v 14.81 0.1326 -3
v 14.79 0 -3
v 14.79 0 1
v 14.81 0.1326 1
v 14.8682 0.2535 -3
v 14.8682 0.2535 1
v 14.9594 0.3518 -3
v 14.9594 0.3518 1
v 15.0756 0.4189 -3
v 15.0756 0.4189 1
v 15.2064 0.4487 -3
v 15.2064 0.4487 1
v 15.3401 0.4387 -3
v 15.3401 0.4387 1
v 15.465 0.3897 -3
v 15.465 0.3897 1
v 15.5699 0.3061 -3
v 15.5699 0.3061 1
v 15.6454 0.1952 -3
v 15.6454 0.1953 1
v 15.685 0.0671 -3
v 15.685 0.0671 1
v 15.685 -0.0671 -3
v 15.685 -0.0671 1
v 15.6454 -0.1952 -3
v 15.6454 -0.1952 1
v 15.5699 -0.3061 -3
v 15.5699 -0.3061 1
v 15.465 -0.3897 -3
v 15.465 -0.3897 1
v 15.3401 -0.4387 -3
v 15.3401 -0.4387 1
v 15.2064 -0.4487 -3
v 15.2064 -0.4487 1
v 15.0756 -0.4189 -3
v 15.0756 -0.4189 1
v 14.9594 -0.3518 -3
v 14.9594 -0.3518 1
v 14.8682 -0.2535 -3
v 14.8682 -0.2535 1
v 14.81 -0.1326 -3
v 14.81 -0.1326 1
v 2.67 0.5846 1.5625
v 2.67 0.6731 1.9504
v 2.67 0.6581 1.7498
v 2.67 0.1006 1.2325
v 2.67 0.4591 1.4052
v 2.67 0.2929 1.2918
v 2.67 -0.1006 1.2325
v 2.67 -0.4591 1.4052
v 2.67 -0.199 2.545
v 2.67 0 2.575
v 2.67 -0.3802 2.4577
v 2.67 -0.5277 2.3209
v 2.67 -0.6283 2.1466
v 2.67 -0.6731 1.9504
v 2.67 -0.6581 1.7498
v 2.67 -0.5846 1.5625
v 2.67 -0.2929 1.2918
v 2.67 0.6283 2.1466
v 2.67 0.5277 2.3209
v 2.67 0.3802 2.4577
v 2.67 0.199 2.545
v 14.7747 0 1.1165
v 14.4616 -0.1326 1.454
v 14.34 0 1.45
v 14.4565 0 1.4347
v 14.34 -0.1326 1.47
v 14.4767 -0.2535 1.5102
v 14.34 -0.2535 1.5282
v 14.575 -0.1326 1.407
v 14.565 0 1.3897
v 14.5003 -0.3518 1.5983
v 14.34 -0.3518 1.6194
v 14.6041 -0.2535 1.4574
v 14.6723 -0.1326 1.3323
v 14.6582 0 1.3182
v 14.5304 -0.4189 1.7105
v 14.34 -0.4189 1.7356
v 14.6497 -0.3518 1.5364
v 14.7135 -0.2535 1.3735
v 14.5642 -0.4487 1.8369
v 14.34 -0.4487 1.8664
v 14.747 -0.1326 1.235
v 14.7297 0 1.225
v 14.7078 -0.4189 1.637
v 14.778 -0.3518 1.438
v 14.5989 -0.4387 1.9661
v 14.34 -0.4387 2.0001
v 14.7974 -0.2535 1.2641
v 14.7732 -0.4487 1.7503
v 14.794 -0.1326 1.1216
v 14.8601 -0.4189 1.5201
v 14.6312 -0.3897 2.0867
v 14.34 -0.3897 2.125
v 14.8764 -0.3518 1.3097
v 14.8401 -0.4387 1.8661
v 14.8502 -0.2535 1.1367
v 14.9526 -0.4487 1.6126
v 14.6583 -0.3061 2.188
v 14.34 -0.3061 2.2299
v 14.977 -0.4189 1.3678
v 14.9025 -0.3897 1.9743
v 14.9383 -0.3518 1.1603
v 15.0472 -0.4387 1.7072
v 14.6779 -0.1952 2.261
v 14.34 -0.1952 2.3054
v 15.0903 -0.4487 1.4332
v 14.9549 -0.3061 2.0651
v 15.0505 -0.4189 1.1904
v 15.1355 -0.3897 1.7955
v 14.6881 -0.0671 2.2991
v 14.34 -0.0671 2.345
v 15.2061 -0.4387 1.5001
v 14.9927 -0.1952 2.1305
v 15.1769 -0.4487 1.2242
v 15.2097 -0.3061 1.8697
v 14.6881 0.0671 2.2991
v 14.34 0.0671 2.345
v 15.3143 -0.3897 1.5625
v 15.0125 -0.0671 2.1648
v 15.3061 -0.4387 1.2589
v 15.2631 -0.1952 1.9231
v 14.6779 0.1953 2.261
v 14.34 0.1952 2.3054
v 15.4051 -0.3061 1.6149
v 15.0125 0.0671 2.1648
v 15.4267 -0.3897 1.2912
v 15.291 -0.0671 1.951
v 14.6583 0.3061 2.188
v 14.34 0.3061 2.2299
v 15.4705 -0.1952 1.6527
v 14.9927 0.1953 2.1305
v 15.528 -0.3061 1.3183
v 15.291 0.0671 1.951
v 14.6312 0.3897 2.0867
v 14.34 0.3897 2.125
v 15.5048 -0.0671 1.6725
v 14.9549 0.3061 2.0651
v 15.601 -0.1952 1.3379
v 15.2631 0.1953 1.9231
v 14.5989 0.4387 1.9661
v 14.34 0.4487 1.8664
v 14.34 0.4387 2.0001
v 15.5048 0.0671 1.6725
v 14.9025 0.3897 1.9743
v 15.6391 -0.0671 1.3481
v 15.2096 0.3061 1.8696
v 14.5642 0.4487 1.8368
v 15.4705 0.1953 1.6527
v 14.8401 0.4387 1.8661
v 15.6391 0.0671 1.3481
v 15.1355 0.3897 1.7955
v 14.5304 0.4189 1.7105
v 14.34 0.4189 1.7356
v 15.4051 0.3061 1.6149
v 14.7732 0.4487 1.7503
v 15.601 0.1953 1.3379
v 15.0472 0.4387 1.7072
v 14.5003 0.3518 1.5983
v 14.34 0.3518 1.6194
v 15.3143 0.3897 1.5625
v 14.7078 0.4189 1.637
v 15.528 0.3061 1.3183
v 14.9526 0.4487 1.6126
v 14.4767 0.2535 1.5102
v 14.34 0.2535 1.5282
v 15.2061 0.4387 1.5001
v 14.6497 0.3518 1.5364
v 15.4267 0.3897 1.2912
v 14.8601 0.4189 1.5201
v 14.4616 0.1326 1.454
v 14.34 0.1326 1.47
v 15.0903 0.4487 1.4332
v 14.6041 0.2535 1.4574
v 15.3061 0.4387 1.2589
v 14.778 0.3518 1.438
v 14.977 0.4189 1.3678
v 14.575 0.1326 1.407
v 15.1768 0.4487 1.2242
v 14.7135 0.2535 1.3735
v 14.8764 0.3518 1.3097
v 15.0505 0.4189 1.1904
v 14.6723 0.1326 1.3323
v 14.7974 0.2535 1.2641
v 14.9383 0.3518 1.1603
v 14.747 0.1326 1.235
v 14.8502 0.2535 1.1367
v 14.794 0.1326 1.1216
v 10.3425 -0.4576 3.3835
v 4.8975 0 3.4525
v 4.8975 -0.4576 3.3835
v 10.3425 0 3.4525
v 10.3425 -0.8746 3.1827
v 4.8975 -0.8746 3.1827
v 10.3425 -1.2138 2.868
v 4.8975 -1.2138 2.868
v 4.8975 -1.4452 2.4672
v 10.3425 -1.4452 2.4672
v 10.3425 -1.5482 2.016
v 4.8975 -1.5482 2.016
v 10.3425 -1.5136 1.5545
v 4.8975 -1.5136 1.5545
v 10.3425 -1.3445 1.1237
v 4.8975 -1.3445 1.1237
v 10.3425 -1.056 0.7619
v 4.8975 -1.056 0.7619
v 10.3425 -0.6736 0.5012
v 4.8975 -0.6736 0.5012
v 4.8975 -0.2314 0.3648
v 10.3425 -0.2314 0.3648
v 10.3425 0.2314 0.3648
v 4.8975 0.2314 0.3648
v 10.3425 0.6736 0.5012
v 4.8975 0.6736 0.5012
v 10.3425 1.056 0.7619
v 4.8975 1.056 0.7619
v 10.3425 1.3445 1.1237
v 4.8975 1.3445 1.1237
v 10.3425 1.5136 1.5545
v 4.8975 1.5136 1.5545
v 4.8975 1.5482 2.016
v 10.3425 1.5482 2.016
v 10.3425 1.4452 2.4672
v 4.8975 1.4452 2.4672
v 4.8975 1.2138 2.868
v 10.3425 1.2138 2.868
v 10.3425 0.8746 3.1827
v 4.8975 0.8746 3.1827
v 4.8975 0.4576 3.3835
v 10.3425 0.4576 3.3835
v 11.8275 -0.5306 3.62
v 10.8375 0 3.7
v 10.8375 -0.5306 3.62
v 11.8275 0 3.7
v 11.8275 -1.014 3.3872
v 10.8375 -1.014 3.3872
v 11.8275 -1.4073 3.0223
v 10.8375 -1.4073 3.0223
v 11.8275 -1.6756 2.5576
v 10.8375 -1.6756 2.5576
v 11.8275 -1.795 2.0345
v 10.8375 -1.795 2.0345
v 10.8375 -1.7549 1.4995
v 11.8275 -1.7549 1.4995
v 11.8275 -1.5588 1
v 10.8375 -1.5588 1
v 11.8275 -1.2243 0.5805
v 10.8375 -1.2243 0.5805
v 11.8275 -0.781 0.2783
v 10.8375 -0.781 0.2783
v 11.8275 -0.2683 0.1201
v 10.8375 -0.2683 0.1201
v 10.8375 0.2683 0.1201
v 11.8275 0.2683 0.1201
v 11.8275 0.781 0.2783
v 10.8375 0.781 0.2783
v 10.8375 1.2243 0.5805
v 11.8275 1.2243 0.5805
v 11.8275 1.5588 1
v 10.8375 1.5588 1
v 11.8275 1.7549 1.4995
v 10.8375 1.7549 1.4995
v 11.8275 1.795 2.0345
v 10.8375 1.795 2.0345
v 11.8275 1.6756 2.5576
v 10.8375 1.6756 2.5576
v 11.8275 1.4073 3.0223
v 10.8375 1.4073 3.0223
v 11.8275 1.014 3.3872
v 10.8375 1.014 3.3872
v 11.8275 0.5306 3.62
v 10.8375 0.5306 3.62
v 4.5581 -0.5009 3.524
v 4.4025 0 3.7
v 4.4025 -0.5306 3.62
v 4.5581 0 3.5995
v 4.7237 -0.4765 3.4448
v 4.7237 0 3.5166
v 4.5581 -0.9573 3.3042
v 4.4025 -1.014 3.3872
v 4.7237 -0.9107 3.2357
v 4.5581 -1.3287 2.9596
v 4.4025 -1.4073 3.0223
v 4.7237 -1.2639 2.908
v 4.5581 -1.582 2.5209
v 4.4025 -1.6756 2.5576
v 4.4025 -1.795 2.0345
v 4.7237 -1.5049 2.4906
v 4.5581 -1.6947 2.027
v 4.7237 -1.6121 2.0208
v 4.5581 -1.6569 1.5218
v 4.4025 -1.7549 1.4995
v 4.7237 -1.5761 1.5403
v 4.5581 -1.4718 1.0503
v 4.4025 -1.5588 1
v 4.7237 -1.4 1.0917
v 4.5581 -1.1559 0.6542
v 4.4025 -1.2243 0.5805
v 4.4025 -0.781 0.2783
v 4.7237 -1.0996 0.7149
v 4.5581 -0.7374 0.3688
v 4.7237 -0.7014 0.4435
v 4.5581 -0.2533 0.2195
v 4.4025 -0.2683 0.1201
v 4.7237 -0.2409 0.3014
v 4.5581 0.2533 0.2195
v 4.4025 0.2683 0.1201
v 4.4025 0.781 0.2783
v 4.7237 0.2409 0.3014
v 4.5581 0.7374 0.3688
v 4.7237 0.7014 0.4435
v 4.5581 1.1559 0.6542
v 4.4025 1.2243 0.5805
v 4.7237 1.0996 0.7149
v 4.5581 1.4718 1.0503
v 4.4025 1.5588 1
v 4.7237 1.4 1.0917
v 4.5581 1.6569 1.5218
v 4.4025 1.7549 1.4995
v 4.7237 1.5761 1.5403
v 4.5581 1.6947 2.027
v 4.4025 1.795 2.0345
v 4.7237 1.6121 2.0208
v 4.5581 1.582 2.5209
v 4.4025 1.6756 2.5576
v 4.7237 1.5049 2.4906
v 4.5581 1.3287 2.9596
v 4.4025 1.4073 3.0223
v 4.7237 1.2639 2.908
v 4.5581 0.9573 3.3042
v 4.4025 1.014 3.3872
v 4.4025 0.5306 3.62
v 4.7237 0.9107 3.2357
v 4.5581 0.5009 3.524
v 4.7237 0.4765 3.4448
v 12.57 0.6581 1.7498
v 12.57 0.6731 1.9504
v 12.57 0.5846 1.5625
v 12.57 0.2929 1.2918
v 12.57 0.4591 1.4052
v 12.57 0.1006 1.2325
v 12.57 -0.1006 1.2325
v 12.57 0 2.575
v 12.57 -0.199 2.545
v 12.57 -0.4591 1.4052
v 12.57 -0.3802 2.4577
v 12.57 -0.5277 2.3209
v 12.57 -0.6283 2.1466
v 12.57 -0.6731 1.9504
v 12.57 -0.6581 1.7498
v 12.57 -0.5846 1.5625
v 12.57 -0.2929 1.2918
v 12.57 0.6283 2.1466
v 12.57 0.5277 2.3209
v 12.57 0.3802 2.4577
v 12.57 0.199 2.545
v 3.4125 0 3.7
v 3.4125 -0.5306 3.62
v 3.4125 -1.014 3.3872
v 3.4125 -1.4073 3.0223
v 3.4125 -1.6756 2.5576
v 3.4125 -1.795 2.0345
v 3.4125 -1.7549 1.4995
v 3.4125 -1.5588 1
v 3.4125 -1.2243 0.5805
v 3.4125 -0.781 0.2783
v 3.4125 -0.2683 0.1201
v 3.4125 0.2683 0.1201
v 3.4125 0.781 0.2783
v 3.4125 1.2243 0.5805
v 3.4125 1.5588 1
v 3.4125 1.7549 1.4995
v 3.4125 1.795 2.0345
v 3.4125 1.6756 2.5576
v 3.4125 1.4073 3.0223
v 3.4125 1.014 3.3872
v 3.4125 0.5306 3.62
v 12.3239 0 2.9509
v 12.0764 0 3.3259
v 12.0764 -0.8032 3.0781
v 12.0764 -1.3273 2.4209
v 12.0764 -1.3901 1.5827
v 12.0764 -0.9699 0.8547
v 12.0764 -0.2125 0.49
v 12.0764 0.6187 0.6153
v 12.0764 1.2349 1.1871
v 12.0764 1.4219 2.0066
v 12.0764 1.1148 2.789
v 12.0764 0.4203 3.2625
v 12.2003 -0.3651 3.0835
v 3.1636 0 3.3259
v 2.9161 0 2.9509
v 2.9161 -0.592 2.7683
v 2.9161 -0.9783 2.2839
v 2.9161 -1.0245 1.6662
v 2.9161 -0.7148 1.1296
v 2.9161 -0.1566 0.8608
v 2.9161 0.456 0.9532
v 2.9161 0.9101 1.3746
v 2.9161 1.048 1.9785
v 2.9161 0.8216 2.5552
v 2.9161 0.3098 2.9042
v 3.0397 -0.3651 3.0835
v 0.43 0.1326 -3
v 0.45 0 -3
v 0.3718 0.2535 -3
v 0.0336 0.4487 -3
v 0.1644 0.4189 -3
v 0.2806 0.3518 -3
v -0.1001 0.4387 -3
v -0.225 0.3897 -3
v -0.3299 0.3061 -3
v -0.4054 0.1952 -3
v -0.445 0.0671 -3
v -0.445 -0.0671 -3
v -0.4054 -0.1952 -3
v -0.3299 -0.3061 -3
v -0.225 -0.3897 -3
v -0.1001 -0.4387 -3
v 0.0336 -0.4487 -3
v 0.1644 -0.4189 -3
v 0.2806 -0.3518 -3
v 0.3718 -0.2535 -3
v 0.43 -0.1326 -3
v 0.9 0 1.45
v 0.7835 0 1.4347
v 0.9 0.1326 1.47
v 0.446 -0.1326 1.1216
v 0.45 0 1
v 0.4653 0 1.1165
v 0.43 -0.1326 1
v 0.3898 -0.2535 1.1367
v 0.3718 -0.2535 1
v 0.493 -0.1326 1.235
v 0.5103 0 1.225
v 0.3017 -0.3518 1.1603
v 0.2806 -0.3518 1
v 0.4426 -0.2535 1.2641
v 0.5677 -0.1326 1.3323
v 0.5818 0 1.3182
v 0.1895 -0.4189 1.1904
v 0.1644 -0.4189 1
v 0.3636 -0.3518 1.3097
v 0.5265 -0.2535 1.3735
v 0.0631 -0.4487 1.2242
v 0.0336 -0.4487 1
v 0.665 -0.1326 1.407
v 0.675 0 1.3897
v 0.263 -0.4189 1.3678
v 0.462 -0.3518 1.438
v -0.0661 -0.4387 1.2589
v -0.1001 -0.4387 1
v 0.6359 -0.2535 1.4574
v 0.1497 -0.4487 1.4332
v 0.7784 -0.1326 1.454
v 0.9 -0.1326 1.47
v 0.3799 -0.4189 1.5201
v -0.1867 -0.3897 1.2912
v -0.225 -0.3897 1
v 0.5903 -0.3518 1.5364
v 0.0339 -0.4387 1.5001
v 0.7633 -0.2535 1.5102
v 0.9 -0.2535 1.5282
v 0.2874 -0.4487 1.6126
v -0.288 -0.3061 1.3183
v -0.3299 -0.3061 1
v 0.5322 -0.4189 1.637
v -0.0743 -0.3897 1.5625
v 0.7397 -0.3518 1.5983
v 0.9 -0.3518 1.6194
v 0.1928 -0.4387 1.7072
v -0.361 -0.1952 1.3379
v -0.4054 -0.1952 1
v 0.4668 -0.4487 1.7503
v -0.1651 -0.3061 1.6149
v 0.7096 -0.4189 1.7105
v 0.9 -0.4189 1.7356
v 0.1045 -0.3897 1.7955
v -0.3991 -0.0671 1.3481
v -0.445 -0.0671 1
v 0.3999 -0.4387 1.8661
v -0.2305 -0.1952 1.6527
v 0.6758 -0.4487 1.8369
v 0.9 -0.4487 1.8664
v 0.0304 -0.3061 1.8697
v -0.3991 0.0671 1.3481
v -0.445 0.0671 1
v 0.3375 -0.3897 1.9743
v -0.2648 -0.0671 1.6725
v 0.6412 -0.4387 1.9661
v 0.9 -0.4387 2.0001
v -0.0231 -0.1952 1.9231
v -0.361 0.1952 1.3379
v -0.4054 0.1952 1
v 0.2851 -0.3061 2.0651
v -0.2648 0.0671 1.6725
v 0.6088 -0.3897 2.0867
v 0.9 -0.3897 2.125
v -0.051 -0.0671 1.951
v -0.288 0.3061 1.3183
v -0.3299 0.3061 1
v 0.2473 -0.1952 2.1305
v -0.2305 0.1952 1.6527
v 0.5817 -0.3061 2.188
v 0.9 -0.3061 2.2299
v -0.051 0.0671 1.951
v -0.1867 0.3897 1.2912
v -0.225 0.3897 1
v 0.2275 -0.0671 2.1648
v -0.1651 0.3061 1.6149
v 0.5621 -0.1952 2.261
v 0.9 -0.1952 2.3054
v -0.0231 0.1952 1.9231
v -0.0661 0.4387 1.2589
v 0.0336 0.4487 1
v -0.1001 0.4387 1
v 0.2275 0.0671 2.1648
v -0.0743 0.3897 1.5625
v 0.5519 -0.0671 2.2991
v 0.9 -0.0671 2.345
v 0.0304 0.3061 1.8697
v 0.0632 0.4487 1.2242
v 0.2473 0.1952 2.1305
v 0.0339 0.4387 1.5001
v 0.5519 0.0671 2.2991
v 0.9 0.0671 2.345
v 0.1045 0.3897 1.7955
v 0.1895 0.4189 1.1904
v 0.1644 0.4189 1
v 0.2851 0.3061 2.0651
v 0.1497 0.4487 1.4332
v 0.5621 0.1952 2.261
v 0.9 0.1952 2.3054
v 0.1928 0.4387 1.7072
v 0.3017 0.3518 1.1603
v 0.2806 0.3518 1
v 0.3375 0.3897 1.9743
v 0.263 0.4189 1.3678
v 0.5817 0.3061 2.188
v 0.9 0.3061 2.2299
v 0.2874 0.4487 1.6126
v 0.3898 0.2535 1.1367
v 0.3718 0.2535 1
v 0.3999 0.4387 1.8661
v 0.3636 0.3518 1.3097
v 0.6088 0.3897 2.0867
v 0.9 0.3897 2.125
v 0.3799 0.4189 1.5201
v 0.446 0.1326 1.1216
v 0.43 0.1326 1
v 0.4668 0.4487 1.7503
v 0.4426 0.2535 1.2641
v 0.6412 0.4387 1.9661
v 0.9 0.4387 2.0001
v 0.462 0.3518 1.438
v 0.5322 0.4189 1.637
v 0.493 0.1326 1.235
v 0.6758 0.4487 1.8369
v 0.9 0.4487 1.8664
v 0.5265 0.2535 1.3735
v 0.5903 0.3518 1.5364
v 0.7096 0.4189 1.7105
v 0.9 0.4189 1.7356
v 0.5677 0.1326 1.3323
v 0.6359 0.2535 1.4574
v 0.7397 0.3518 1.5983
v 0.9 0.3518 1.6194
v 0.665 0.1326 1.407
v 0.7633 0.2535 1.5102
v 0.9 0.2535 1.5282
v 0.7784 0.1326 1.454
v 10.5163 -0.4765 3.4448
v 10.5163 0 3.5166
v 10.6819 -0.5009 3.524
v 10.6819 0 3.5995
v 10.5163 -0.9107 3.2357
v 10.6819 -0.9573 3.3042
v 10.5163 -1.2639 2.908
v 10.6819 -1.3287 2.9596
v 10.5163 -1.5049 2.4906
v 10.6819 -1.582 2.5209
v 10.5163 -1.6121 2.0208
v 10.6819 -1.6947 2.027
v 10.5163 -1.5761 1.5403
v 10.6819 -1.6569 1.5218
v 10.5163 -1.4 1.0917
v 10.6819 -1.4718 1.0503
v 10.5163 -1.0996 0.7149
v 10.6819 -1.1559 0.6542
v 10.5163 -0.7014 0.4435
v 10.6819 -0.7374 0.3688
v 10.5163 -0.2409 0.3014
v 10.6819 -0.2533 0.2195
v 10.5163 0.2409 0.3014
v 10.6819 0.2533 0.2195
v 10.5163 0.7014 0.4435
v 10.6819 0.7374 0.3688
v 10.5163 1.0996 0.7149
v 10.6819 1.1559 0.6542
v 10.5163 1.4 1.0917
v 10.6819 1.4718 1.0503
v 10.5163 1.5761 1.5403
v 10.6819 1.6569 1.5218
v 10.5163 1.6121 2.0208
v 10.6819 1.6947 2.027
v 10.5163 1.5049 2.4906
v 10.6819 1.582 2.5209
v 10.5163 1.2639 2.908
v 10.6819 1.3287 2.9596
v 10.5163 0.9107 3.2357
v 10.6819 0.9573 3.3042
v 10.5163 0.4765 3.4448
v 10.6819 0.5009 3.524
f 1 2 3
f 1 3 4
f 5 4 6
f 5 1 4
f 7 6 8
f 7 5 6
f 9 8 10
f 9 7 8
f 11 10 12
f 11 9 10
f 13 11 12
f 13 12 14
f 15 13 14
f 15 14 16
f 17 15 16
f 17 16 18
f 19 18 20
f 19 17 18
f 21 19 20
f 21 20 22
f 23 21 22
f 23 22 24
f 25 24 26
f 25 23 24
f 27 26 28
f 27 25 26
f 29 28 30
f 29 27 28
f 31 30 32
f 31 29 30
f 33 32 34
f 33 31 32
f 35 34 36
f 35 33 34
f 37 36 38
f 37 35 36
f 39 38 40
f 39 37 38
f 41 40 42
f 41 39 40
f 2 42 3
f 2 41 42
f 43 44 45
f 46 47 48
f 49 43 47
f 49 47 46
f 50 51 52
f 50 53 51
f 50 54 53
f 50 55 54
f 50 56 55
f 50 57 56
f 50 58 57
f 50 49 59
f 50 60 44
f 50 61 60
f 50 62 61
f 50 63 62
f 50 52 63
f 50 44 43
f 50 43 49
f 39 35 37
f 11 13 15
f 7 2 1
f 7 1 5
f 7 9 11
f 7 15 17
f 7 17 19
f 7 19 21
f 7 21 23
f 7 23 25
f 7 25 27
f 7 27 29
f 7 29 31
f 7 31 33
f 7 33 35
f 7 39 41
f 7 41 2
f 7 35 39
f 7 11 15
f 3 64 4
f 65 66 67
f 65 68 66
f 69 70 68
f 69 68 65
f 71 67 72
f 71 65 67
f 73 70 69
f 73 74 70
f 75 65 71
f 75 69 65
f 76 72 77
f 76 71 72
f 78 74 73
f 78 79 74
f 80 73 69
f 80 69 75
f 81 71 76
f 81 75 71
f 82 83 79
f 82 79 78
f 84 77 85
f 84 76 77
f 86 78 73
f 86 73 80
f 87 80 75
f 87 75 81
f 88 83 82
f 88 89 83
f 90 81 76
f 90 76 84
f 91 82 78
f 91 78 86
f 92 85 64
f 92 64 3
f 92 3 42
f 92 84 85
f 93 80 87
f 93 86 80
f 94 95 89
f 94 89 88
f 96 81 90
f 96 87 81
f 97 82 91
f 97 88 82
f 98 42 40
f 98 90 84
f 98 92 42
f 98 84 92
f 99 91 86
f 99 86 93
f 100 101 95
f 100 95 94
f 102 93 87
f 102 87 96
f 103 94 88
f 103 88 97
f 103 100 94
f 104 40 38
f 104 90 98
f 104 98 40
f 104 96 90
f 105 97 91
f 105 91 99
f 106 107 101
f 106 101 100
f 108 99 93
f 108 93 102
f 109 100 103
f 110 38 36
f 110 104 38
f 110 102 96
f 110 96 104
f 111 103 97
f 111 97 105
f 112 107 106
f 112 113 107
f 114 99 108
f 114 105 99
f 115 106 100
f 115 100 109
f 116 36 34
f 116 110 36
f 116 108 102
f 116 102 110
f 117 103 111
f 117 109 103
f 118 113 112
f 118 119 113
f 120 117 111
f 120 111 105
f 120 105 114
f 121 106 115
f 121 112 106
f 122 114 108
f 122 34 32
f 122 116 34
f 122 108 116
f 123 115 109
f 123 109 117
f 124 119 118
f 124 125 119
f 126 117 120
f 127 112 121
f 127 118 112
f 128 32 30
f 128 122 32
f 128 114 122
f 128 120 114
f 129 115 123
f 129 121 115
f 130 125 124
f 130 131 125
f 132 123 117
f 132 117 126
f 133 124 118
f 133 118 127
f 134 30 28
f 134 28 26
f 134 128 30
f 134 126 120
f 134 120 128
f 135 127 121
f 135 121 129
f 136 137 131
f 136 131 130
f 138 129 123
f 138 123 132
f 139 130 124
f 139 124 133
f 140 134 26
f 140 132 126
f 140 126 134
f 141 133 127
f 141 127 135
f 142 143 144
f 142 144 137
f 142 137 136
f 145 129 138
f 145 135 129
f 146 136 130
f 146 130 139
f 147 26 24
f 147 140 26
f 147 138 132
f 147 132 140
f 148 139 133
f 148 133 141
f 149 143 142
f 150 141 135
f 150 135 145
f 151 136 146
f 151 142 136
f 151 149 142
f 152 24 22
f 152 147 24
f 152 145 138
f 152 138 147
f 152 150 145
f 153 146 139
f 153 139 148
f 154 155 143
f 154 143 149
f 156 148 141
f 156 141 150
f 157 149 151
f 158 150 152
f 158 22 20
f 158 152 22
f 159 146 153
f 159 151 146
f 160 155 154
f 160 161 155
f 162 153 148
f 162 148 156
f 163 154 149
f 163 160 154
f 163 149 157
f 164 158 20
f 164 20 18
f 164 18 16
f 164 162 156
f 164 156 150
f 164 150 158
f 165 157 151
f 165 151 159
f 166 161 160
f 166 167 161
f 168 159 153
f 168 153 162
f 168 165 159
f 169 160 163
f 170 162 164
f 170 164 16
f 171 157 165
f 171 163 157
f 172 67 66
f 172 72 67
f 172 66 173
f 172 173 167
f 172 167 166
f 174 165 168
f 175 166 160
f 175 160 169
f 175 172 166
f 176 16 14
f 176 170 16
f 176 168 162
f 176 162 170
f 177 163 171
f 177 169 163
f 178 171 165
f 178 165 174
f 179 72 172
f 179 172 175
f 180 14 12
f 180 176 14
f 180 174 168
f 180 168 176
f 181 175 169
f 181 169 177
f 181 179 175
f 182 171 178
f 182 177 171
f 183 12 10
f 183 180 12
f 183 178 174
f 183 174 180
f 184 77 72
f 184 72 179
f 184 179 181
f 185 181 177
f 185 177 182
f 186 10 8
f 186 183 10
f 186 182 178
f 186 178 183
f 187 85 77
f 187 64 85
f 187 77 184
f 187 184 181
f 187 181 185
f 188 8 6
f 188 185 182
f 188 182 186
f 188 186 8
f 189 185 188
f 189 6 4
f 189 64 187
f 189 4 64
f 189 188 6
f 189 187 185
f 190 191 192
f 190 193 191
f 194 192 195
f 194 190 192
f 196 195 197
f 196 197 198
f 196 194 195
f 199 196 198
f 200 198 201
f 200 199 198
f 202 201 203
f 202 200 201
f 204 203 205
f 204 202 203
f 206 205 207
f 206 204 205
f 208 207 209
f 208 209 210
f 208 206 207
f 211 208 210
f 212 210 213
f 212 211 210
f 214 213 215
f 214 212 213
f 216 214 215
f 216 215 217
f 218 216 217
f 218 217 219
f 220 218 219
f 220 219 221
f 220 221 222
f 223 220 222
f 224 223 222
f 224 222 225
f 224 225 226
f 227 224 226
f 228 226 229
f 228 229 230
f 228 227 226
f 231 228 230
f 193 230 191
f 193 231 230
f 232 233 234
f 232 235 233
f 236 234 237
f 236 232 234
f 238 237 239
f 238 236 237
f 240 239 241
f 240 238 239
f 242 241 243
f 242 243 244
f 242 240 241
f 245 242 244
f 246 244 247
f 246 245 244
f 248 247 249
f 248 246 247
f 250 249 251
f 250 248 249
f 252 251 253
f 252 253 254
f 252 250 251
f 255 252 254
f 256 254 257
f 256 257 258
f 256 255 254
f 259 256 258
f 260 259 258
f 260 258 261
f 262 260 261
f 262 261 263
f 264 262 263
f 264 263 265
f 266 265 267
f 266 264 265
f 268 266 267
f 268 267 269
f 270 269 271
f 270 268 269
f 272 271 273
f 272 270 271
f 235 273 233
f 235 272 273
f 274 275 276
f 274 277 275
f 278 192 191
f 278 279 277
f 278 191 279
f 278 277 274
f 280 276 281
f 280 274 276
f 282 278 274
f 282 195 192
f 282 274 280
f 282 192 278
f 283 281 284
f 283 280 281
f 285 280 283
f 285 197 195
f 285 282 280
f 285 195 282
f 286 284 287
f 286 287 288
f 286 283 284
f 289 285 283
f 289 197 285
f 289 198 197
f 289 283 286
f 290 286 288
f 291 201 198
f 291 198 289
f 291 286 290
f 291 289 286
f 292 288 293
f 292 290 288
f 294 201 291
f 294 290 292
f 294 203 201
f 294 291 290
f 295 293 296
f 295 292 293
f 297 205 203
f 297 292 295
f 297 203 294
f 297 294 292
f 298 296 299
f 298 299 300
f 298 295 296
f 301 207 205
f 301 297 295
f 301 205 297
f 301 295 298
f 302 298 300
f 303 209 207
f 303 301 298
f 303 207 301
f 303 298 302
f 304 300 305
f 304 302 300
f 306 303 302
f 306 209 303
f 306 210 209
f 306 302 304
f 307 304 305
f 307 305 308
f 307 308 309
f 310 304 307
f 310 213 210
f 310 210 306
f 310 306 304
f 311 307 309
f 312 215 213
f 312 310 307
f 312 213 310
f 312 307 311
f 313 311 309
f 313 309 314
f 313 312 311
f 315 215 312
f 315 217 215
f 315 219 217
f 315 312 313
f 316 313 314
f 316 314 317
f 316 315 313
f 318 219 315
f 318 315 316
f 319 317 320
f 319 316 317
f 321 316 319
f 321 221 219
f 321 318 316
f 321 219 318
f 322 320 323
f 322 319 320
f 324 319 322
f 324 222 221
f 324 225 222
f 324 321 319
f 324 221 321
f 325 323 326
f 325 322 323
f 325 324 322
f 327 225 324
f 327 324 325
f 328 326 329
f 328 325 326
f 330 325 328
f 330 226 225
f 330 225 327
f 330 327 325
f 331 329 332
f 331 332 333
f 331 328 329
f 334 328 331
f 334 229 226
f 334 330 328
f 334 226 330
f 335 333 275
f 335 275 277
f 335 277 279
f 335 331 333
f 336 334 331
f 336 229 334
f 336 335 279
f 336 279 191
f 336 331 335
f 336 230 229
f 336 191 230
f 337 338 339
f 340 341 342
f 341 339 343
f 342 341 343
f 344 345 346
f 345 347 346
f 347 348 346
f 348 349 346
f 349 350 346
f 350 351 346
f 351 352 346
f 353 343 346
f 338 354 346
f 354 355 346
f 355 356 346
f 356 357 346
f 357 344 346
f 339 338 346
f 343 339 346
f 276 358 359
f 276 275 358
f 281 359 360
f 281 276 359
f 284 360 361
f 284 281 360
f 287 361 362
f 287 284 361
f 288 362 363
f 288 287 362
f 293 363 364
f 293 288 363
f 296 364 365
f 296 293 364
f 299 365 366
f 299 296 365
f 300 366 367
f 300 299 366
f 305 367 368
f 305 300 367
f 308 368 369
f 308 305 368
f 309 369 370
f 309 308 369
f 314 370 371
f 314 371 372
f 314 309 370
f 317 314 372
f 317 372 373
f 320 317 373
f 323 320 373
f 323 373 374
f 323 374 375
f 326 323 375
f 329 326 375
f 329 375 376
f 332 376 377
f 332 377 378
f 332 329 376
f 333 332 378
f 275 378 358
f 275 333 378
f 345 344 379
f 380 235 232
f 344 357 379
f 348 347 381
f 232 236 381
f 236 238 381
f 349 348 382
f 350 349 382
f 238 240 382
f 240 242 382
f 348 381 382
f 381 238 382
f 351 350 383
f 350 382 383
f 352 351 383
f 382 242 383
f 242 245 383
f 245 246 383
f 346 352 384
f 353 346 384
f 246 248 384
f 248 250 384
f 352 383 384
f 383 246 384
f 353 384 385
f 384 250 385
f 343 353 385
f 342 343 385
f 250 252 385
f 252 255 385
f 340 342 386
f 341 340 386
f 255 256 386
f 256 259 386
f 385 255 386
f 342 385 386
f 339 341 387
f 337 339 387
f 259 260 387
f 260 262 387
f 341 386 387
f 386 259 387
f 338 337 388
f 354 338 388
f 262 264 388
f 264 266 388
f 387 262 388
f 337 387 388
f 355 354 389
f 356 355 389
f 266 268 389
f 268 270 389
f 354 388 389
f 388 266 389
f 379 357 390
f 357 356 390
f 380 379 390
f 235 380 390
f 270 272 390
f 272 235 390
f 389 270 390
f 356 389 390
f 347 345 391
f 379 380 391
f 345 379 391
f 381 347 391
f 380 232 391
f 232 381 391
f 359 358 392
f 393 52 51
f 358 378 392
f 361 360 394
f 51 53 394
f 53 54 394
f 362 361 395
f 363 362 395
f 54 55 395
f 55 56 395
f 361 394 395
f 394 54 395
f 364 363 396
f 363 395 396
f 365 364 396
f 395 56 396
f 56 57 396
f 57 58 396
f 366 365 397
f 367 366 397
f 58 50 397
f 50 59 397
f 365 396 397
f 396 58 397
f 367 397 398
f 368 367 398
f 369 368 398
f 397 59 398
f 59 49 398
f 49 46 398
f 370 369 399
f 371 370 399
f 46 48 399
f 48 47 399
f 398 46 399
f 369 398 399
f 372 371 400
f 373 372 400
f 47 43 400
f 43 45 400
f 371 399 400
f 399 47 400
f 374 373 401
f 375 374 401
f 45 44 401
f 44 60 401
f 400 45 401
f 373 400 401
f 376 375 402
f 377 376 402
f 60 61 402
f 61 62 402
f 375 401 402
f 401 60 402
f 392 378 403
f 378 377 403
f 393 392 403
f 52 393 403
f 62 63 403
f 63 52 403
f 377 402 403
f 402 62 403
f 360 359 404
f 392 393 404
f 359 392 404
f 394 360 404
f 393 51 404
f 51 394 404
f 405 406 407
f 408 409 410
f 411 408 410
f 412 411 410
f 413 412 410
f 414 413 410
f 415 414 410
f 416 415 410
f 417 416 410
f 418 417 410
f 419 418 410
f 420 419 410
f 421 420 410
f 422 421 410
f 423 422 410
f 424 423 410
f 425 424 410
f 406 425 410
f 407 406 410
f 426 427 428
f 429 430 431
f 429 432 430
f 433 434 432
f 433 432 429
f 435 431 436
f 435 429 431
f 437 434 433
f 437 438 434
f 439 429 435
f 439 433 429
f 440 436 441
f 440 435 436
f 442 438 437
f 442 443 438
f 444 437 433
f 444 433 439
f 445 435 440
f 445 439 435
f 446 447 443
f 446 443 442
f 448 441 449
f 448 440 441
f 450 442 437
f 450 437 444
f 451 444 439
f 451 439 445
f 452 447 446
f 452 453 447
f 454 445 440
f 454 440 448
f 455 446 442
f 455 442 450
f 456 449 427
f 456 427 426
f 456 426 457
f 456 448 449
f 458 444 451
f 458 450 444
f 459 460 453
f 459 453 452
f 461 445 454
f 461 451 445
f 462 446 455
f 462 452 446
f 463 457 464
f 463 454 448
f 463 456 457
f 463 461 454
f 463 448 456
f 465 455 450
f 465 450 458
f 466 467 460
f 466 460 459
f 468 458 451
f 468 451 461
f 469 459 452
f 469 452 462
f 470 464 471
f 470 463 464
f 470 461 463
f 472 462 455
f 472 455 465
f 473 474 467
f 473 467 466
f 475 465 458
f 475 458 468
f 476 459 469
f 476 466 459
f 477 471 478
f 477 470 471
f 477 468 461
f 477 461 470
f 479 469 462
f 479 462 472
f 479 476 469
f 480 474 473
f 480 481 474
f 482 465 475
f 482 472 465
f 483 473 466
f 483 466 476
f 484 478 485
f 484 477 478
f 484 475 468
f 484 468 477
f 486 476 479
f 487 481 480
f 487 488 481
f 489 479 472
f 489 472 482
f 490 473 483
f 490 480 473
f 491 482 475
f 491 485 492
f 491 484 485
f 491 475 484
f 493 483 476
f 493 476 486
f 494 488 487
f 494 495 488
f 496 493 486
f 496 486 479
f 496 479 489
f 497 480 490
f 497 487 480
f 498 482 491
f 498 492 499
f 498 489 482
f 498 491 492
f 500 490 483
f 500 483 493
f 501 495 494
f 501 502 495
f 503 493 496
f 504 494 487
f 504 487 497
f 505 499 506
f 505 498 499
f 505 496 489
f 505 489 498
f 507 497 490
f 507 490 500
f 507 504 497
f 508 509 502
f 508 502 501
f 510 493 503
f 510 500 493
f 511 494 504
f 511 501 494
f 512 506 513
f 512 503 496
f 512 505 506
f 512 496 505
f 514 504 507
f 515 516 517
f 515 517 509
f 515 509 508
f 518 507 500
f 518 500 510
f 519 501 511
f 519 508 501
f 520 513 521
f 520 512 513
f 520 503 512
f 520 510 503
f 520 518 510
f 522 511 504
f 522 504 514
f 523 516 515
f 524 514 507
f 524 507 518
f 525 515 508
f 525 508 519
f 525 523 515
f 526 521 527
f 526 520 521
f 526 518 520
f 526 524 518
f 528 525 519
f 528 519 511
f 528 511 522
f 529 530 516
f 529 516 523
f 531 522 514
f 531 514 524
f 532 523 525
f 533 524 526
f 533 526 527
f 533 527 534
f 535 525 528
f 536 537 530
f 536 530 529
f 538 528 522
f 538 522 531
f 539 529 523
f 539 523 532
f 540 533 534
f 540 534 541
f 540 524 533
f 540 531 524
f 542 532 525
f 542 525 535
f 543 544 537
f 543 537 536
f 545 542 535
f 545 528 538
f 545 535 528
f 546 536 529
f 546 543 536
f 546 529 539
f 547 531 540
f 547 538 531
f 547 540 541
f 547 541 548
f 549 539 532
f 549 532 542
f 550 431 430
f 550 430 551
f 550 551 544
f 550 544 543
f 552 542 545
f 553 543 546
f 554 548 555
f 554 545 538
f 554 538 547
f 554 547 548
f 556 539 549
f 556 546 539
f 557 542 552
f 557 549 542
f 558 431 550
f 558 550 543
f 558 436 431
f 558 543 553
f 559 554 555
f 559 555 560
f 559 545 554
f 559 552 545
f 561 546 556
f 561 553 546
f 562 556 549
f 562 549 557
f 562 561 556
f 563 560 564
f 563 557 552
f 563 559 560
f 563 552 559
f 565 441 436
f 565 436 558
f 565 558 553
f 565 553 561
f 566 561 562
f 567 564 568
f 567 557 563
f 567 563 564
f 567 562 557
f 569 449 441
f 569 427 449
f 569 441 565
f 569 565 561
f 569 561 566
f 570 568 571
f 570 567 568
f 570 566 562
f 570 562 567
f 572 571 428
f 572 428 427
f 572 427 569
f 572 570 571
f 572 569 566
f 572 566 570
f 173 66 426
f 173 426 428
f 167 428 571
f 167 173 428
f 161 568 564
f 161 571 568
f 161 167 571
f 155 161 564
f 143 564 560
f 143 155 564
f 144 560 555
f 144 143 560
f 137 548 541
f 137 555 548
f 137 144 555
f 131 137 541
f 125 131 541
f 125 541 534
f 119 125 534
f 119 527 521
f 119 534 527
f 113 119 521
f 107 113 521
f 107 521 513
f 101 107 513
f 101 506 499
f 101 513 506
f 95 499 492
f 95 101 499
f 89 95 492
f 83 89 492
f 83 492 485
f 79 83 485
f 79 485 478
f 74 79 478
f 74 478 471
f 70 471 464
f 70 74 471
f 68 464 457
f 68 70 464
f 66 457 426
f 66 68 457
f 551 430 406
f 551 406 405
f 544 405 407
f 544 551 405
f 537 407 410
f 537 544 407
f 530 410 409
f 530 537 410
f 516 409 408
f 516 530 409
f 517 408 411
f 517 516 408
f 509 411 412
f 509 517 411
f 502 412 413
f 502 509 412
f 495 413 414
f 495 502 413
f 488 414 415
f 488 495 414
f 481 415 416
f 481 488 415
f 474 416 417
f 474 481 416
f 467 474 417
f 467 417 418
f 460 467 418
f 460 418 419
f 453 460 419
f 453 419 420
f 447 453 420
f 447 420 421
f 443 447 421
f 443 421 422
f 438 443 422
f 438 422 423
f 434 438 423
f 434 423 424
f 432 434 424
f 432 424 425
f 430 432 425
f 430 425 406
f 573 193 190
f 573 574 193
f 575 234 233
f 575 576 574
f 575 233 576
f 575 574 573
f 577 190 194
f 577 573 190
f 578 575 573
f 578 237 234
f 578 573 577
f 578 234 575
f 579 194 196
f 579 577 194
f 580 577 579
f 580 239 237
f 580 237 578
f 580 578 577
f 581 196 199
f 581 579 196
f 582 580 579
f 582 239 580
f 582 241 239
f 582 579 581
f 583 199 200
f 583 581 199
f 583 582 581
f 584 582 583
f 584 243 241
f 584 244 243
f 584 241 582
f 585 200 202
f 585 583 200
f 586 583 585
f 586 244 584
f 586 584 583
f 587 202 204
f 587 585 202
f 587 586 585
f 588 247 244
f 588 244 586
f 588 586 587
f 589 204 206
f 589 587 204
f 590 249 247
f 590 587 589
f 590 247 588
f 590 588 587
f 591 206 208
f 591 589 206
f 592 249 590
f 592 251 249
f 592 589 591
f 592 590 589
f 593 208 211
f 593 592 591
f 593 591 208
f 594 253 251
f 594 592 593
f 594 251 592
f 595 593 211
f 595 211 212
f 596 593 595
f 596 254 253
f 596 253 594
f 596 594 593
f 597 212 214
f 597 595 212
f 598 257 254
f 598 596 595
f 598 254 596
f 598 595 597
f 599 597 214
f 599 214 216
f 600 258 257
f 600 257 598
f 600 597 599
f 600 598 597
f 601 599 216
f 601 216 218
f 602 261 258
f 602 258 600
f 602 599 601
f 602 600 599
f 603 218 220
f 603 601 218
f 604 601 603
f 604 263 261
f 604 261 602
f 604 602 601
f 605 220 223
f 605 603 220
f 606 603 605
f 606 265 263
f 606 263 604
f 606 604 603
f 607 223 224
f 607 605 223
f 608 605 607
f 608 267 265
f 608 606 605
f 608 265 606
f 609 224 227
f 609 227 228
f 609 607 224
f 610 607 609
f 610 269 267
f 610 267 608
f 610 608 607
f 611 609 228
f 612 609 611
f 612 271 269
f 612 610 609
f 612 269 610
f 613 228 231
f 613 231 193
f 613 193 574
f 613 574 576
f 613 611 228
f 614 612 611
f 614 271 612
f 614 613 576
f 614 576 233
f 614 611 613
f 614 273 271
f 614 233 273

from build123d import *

# Parameters (mm, degrees)
SKETCH_R = 0.45


with BuildPart() as revolution:
    # Sketch002 → Revolution (revolve)
    with BuildSketch(Plane.XZ):
        with BuildLine():
            Line((3.4125, 3.7), (4.4025, 3.7))
            ThreePointArc((4.4025, 3.7), (4.639758, 3.555766), (4.8975, 3.4525))
            Line((4.8975, 3.4525), (10.3425, 3.4525))
            ThreePointArc((10.3425, 3.4525), (10.600242, 3.555766), (10.8375, 3.7))
            Line((10.8375, 3.7), (11.8275, 3.7))
            ThreePointArc((12.57, 2.575), (12.20028, 3.13851), (11.8275, 3.7))
            Line((12.57, 1.9), (12.57, 2.575))
            Line((2.67, 1.9), (12.57, 1.9))
            Line((2.67, 1.9), (2.67, 2.575))
            ThreePointArc((3.4125, 3.7), (3.03972, 3.13851), (2.67, 2.575))
        make_face()
    revolve(axis=Axis((2.67, 0, 1.9), (1, 0, 0)))


with BuildPart() as sweep_body:
    # Sweep: sweep along a path in Sketch001
    with BuildLine(Plane.XZ) as sweep_path:
        Line((0, -3), (0, 1))
        ThreePointArc((0, 1), (0.263608, 1.6364), (0.900011, 1.9))
        Line((0.900011, 1.9), (14.34, 1.9))
        ThreePointArc((14.34, 1.9), (14.976396, 1.636396), (15.24, 1))
        Line((15.24, 1), (15.24, -3))
    # Sketch → Sweep (sweep)
    with BuildSketch(Plane.XY.offset(-2)):
        Circle(SKETCH_R)
    sweep(path=sweep_path.line)


solid = Compound([revolution.part, sweep_body.part])
